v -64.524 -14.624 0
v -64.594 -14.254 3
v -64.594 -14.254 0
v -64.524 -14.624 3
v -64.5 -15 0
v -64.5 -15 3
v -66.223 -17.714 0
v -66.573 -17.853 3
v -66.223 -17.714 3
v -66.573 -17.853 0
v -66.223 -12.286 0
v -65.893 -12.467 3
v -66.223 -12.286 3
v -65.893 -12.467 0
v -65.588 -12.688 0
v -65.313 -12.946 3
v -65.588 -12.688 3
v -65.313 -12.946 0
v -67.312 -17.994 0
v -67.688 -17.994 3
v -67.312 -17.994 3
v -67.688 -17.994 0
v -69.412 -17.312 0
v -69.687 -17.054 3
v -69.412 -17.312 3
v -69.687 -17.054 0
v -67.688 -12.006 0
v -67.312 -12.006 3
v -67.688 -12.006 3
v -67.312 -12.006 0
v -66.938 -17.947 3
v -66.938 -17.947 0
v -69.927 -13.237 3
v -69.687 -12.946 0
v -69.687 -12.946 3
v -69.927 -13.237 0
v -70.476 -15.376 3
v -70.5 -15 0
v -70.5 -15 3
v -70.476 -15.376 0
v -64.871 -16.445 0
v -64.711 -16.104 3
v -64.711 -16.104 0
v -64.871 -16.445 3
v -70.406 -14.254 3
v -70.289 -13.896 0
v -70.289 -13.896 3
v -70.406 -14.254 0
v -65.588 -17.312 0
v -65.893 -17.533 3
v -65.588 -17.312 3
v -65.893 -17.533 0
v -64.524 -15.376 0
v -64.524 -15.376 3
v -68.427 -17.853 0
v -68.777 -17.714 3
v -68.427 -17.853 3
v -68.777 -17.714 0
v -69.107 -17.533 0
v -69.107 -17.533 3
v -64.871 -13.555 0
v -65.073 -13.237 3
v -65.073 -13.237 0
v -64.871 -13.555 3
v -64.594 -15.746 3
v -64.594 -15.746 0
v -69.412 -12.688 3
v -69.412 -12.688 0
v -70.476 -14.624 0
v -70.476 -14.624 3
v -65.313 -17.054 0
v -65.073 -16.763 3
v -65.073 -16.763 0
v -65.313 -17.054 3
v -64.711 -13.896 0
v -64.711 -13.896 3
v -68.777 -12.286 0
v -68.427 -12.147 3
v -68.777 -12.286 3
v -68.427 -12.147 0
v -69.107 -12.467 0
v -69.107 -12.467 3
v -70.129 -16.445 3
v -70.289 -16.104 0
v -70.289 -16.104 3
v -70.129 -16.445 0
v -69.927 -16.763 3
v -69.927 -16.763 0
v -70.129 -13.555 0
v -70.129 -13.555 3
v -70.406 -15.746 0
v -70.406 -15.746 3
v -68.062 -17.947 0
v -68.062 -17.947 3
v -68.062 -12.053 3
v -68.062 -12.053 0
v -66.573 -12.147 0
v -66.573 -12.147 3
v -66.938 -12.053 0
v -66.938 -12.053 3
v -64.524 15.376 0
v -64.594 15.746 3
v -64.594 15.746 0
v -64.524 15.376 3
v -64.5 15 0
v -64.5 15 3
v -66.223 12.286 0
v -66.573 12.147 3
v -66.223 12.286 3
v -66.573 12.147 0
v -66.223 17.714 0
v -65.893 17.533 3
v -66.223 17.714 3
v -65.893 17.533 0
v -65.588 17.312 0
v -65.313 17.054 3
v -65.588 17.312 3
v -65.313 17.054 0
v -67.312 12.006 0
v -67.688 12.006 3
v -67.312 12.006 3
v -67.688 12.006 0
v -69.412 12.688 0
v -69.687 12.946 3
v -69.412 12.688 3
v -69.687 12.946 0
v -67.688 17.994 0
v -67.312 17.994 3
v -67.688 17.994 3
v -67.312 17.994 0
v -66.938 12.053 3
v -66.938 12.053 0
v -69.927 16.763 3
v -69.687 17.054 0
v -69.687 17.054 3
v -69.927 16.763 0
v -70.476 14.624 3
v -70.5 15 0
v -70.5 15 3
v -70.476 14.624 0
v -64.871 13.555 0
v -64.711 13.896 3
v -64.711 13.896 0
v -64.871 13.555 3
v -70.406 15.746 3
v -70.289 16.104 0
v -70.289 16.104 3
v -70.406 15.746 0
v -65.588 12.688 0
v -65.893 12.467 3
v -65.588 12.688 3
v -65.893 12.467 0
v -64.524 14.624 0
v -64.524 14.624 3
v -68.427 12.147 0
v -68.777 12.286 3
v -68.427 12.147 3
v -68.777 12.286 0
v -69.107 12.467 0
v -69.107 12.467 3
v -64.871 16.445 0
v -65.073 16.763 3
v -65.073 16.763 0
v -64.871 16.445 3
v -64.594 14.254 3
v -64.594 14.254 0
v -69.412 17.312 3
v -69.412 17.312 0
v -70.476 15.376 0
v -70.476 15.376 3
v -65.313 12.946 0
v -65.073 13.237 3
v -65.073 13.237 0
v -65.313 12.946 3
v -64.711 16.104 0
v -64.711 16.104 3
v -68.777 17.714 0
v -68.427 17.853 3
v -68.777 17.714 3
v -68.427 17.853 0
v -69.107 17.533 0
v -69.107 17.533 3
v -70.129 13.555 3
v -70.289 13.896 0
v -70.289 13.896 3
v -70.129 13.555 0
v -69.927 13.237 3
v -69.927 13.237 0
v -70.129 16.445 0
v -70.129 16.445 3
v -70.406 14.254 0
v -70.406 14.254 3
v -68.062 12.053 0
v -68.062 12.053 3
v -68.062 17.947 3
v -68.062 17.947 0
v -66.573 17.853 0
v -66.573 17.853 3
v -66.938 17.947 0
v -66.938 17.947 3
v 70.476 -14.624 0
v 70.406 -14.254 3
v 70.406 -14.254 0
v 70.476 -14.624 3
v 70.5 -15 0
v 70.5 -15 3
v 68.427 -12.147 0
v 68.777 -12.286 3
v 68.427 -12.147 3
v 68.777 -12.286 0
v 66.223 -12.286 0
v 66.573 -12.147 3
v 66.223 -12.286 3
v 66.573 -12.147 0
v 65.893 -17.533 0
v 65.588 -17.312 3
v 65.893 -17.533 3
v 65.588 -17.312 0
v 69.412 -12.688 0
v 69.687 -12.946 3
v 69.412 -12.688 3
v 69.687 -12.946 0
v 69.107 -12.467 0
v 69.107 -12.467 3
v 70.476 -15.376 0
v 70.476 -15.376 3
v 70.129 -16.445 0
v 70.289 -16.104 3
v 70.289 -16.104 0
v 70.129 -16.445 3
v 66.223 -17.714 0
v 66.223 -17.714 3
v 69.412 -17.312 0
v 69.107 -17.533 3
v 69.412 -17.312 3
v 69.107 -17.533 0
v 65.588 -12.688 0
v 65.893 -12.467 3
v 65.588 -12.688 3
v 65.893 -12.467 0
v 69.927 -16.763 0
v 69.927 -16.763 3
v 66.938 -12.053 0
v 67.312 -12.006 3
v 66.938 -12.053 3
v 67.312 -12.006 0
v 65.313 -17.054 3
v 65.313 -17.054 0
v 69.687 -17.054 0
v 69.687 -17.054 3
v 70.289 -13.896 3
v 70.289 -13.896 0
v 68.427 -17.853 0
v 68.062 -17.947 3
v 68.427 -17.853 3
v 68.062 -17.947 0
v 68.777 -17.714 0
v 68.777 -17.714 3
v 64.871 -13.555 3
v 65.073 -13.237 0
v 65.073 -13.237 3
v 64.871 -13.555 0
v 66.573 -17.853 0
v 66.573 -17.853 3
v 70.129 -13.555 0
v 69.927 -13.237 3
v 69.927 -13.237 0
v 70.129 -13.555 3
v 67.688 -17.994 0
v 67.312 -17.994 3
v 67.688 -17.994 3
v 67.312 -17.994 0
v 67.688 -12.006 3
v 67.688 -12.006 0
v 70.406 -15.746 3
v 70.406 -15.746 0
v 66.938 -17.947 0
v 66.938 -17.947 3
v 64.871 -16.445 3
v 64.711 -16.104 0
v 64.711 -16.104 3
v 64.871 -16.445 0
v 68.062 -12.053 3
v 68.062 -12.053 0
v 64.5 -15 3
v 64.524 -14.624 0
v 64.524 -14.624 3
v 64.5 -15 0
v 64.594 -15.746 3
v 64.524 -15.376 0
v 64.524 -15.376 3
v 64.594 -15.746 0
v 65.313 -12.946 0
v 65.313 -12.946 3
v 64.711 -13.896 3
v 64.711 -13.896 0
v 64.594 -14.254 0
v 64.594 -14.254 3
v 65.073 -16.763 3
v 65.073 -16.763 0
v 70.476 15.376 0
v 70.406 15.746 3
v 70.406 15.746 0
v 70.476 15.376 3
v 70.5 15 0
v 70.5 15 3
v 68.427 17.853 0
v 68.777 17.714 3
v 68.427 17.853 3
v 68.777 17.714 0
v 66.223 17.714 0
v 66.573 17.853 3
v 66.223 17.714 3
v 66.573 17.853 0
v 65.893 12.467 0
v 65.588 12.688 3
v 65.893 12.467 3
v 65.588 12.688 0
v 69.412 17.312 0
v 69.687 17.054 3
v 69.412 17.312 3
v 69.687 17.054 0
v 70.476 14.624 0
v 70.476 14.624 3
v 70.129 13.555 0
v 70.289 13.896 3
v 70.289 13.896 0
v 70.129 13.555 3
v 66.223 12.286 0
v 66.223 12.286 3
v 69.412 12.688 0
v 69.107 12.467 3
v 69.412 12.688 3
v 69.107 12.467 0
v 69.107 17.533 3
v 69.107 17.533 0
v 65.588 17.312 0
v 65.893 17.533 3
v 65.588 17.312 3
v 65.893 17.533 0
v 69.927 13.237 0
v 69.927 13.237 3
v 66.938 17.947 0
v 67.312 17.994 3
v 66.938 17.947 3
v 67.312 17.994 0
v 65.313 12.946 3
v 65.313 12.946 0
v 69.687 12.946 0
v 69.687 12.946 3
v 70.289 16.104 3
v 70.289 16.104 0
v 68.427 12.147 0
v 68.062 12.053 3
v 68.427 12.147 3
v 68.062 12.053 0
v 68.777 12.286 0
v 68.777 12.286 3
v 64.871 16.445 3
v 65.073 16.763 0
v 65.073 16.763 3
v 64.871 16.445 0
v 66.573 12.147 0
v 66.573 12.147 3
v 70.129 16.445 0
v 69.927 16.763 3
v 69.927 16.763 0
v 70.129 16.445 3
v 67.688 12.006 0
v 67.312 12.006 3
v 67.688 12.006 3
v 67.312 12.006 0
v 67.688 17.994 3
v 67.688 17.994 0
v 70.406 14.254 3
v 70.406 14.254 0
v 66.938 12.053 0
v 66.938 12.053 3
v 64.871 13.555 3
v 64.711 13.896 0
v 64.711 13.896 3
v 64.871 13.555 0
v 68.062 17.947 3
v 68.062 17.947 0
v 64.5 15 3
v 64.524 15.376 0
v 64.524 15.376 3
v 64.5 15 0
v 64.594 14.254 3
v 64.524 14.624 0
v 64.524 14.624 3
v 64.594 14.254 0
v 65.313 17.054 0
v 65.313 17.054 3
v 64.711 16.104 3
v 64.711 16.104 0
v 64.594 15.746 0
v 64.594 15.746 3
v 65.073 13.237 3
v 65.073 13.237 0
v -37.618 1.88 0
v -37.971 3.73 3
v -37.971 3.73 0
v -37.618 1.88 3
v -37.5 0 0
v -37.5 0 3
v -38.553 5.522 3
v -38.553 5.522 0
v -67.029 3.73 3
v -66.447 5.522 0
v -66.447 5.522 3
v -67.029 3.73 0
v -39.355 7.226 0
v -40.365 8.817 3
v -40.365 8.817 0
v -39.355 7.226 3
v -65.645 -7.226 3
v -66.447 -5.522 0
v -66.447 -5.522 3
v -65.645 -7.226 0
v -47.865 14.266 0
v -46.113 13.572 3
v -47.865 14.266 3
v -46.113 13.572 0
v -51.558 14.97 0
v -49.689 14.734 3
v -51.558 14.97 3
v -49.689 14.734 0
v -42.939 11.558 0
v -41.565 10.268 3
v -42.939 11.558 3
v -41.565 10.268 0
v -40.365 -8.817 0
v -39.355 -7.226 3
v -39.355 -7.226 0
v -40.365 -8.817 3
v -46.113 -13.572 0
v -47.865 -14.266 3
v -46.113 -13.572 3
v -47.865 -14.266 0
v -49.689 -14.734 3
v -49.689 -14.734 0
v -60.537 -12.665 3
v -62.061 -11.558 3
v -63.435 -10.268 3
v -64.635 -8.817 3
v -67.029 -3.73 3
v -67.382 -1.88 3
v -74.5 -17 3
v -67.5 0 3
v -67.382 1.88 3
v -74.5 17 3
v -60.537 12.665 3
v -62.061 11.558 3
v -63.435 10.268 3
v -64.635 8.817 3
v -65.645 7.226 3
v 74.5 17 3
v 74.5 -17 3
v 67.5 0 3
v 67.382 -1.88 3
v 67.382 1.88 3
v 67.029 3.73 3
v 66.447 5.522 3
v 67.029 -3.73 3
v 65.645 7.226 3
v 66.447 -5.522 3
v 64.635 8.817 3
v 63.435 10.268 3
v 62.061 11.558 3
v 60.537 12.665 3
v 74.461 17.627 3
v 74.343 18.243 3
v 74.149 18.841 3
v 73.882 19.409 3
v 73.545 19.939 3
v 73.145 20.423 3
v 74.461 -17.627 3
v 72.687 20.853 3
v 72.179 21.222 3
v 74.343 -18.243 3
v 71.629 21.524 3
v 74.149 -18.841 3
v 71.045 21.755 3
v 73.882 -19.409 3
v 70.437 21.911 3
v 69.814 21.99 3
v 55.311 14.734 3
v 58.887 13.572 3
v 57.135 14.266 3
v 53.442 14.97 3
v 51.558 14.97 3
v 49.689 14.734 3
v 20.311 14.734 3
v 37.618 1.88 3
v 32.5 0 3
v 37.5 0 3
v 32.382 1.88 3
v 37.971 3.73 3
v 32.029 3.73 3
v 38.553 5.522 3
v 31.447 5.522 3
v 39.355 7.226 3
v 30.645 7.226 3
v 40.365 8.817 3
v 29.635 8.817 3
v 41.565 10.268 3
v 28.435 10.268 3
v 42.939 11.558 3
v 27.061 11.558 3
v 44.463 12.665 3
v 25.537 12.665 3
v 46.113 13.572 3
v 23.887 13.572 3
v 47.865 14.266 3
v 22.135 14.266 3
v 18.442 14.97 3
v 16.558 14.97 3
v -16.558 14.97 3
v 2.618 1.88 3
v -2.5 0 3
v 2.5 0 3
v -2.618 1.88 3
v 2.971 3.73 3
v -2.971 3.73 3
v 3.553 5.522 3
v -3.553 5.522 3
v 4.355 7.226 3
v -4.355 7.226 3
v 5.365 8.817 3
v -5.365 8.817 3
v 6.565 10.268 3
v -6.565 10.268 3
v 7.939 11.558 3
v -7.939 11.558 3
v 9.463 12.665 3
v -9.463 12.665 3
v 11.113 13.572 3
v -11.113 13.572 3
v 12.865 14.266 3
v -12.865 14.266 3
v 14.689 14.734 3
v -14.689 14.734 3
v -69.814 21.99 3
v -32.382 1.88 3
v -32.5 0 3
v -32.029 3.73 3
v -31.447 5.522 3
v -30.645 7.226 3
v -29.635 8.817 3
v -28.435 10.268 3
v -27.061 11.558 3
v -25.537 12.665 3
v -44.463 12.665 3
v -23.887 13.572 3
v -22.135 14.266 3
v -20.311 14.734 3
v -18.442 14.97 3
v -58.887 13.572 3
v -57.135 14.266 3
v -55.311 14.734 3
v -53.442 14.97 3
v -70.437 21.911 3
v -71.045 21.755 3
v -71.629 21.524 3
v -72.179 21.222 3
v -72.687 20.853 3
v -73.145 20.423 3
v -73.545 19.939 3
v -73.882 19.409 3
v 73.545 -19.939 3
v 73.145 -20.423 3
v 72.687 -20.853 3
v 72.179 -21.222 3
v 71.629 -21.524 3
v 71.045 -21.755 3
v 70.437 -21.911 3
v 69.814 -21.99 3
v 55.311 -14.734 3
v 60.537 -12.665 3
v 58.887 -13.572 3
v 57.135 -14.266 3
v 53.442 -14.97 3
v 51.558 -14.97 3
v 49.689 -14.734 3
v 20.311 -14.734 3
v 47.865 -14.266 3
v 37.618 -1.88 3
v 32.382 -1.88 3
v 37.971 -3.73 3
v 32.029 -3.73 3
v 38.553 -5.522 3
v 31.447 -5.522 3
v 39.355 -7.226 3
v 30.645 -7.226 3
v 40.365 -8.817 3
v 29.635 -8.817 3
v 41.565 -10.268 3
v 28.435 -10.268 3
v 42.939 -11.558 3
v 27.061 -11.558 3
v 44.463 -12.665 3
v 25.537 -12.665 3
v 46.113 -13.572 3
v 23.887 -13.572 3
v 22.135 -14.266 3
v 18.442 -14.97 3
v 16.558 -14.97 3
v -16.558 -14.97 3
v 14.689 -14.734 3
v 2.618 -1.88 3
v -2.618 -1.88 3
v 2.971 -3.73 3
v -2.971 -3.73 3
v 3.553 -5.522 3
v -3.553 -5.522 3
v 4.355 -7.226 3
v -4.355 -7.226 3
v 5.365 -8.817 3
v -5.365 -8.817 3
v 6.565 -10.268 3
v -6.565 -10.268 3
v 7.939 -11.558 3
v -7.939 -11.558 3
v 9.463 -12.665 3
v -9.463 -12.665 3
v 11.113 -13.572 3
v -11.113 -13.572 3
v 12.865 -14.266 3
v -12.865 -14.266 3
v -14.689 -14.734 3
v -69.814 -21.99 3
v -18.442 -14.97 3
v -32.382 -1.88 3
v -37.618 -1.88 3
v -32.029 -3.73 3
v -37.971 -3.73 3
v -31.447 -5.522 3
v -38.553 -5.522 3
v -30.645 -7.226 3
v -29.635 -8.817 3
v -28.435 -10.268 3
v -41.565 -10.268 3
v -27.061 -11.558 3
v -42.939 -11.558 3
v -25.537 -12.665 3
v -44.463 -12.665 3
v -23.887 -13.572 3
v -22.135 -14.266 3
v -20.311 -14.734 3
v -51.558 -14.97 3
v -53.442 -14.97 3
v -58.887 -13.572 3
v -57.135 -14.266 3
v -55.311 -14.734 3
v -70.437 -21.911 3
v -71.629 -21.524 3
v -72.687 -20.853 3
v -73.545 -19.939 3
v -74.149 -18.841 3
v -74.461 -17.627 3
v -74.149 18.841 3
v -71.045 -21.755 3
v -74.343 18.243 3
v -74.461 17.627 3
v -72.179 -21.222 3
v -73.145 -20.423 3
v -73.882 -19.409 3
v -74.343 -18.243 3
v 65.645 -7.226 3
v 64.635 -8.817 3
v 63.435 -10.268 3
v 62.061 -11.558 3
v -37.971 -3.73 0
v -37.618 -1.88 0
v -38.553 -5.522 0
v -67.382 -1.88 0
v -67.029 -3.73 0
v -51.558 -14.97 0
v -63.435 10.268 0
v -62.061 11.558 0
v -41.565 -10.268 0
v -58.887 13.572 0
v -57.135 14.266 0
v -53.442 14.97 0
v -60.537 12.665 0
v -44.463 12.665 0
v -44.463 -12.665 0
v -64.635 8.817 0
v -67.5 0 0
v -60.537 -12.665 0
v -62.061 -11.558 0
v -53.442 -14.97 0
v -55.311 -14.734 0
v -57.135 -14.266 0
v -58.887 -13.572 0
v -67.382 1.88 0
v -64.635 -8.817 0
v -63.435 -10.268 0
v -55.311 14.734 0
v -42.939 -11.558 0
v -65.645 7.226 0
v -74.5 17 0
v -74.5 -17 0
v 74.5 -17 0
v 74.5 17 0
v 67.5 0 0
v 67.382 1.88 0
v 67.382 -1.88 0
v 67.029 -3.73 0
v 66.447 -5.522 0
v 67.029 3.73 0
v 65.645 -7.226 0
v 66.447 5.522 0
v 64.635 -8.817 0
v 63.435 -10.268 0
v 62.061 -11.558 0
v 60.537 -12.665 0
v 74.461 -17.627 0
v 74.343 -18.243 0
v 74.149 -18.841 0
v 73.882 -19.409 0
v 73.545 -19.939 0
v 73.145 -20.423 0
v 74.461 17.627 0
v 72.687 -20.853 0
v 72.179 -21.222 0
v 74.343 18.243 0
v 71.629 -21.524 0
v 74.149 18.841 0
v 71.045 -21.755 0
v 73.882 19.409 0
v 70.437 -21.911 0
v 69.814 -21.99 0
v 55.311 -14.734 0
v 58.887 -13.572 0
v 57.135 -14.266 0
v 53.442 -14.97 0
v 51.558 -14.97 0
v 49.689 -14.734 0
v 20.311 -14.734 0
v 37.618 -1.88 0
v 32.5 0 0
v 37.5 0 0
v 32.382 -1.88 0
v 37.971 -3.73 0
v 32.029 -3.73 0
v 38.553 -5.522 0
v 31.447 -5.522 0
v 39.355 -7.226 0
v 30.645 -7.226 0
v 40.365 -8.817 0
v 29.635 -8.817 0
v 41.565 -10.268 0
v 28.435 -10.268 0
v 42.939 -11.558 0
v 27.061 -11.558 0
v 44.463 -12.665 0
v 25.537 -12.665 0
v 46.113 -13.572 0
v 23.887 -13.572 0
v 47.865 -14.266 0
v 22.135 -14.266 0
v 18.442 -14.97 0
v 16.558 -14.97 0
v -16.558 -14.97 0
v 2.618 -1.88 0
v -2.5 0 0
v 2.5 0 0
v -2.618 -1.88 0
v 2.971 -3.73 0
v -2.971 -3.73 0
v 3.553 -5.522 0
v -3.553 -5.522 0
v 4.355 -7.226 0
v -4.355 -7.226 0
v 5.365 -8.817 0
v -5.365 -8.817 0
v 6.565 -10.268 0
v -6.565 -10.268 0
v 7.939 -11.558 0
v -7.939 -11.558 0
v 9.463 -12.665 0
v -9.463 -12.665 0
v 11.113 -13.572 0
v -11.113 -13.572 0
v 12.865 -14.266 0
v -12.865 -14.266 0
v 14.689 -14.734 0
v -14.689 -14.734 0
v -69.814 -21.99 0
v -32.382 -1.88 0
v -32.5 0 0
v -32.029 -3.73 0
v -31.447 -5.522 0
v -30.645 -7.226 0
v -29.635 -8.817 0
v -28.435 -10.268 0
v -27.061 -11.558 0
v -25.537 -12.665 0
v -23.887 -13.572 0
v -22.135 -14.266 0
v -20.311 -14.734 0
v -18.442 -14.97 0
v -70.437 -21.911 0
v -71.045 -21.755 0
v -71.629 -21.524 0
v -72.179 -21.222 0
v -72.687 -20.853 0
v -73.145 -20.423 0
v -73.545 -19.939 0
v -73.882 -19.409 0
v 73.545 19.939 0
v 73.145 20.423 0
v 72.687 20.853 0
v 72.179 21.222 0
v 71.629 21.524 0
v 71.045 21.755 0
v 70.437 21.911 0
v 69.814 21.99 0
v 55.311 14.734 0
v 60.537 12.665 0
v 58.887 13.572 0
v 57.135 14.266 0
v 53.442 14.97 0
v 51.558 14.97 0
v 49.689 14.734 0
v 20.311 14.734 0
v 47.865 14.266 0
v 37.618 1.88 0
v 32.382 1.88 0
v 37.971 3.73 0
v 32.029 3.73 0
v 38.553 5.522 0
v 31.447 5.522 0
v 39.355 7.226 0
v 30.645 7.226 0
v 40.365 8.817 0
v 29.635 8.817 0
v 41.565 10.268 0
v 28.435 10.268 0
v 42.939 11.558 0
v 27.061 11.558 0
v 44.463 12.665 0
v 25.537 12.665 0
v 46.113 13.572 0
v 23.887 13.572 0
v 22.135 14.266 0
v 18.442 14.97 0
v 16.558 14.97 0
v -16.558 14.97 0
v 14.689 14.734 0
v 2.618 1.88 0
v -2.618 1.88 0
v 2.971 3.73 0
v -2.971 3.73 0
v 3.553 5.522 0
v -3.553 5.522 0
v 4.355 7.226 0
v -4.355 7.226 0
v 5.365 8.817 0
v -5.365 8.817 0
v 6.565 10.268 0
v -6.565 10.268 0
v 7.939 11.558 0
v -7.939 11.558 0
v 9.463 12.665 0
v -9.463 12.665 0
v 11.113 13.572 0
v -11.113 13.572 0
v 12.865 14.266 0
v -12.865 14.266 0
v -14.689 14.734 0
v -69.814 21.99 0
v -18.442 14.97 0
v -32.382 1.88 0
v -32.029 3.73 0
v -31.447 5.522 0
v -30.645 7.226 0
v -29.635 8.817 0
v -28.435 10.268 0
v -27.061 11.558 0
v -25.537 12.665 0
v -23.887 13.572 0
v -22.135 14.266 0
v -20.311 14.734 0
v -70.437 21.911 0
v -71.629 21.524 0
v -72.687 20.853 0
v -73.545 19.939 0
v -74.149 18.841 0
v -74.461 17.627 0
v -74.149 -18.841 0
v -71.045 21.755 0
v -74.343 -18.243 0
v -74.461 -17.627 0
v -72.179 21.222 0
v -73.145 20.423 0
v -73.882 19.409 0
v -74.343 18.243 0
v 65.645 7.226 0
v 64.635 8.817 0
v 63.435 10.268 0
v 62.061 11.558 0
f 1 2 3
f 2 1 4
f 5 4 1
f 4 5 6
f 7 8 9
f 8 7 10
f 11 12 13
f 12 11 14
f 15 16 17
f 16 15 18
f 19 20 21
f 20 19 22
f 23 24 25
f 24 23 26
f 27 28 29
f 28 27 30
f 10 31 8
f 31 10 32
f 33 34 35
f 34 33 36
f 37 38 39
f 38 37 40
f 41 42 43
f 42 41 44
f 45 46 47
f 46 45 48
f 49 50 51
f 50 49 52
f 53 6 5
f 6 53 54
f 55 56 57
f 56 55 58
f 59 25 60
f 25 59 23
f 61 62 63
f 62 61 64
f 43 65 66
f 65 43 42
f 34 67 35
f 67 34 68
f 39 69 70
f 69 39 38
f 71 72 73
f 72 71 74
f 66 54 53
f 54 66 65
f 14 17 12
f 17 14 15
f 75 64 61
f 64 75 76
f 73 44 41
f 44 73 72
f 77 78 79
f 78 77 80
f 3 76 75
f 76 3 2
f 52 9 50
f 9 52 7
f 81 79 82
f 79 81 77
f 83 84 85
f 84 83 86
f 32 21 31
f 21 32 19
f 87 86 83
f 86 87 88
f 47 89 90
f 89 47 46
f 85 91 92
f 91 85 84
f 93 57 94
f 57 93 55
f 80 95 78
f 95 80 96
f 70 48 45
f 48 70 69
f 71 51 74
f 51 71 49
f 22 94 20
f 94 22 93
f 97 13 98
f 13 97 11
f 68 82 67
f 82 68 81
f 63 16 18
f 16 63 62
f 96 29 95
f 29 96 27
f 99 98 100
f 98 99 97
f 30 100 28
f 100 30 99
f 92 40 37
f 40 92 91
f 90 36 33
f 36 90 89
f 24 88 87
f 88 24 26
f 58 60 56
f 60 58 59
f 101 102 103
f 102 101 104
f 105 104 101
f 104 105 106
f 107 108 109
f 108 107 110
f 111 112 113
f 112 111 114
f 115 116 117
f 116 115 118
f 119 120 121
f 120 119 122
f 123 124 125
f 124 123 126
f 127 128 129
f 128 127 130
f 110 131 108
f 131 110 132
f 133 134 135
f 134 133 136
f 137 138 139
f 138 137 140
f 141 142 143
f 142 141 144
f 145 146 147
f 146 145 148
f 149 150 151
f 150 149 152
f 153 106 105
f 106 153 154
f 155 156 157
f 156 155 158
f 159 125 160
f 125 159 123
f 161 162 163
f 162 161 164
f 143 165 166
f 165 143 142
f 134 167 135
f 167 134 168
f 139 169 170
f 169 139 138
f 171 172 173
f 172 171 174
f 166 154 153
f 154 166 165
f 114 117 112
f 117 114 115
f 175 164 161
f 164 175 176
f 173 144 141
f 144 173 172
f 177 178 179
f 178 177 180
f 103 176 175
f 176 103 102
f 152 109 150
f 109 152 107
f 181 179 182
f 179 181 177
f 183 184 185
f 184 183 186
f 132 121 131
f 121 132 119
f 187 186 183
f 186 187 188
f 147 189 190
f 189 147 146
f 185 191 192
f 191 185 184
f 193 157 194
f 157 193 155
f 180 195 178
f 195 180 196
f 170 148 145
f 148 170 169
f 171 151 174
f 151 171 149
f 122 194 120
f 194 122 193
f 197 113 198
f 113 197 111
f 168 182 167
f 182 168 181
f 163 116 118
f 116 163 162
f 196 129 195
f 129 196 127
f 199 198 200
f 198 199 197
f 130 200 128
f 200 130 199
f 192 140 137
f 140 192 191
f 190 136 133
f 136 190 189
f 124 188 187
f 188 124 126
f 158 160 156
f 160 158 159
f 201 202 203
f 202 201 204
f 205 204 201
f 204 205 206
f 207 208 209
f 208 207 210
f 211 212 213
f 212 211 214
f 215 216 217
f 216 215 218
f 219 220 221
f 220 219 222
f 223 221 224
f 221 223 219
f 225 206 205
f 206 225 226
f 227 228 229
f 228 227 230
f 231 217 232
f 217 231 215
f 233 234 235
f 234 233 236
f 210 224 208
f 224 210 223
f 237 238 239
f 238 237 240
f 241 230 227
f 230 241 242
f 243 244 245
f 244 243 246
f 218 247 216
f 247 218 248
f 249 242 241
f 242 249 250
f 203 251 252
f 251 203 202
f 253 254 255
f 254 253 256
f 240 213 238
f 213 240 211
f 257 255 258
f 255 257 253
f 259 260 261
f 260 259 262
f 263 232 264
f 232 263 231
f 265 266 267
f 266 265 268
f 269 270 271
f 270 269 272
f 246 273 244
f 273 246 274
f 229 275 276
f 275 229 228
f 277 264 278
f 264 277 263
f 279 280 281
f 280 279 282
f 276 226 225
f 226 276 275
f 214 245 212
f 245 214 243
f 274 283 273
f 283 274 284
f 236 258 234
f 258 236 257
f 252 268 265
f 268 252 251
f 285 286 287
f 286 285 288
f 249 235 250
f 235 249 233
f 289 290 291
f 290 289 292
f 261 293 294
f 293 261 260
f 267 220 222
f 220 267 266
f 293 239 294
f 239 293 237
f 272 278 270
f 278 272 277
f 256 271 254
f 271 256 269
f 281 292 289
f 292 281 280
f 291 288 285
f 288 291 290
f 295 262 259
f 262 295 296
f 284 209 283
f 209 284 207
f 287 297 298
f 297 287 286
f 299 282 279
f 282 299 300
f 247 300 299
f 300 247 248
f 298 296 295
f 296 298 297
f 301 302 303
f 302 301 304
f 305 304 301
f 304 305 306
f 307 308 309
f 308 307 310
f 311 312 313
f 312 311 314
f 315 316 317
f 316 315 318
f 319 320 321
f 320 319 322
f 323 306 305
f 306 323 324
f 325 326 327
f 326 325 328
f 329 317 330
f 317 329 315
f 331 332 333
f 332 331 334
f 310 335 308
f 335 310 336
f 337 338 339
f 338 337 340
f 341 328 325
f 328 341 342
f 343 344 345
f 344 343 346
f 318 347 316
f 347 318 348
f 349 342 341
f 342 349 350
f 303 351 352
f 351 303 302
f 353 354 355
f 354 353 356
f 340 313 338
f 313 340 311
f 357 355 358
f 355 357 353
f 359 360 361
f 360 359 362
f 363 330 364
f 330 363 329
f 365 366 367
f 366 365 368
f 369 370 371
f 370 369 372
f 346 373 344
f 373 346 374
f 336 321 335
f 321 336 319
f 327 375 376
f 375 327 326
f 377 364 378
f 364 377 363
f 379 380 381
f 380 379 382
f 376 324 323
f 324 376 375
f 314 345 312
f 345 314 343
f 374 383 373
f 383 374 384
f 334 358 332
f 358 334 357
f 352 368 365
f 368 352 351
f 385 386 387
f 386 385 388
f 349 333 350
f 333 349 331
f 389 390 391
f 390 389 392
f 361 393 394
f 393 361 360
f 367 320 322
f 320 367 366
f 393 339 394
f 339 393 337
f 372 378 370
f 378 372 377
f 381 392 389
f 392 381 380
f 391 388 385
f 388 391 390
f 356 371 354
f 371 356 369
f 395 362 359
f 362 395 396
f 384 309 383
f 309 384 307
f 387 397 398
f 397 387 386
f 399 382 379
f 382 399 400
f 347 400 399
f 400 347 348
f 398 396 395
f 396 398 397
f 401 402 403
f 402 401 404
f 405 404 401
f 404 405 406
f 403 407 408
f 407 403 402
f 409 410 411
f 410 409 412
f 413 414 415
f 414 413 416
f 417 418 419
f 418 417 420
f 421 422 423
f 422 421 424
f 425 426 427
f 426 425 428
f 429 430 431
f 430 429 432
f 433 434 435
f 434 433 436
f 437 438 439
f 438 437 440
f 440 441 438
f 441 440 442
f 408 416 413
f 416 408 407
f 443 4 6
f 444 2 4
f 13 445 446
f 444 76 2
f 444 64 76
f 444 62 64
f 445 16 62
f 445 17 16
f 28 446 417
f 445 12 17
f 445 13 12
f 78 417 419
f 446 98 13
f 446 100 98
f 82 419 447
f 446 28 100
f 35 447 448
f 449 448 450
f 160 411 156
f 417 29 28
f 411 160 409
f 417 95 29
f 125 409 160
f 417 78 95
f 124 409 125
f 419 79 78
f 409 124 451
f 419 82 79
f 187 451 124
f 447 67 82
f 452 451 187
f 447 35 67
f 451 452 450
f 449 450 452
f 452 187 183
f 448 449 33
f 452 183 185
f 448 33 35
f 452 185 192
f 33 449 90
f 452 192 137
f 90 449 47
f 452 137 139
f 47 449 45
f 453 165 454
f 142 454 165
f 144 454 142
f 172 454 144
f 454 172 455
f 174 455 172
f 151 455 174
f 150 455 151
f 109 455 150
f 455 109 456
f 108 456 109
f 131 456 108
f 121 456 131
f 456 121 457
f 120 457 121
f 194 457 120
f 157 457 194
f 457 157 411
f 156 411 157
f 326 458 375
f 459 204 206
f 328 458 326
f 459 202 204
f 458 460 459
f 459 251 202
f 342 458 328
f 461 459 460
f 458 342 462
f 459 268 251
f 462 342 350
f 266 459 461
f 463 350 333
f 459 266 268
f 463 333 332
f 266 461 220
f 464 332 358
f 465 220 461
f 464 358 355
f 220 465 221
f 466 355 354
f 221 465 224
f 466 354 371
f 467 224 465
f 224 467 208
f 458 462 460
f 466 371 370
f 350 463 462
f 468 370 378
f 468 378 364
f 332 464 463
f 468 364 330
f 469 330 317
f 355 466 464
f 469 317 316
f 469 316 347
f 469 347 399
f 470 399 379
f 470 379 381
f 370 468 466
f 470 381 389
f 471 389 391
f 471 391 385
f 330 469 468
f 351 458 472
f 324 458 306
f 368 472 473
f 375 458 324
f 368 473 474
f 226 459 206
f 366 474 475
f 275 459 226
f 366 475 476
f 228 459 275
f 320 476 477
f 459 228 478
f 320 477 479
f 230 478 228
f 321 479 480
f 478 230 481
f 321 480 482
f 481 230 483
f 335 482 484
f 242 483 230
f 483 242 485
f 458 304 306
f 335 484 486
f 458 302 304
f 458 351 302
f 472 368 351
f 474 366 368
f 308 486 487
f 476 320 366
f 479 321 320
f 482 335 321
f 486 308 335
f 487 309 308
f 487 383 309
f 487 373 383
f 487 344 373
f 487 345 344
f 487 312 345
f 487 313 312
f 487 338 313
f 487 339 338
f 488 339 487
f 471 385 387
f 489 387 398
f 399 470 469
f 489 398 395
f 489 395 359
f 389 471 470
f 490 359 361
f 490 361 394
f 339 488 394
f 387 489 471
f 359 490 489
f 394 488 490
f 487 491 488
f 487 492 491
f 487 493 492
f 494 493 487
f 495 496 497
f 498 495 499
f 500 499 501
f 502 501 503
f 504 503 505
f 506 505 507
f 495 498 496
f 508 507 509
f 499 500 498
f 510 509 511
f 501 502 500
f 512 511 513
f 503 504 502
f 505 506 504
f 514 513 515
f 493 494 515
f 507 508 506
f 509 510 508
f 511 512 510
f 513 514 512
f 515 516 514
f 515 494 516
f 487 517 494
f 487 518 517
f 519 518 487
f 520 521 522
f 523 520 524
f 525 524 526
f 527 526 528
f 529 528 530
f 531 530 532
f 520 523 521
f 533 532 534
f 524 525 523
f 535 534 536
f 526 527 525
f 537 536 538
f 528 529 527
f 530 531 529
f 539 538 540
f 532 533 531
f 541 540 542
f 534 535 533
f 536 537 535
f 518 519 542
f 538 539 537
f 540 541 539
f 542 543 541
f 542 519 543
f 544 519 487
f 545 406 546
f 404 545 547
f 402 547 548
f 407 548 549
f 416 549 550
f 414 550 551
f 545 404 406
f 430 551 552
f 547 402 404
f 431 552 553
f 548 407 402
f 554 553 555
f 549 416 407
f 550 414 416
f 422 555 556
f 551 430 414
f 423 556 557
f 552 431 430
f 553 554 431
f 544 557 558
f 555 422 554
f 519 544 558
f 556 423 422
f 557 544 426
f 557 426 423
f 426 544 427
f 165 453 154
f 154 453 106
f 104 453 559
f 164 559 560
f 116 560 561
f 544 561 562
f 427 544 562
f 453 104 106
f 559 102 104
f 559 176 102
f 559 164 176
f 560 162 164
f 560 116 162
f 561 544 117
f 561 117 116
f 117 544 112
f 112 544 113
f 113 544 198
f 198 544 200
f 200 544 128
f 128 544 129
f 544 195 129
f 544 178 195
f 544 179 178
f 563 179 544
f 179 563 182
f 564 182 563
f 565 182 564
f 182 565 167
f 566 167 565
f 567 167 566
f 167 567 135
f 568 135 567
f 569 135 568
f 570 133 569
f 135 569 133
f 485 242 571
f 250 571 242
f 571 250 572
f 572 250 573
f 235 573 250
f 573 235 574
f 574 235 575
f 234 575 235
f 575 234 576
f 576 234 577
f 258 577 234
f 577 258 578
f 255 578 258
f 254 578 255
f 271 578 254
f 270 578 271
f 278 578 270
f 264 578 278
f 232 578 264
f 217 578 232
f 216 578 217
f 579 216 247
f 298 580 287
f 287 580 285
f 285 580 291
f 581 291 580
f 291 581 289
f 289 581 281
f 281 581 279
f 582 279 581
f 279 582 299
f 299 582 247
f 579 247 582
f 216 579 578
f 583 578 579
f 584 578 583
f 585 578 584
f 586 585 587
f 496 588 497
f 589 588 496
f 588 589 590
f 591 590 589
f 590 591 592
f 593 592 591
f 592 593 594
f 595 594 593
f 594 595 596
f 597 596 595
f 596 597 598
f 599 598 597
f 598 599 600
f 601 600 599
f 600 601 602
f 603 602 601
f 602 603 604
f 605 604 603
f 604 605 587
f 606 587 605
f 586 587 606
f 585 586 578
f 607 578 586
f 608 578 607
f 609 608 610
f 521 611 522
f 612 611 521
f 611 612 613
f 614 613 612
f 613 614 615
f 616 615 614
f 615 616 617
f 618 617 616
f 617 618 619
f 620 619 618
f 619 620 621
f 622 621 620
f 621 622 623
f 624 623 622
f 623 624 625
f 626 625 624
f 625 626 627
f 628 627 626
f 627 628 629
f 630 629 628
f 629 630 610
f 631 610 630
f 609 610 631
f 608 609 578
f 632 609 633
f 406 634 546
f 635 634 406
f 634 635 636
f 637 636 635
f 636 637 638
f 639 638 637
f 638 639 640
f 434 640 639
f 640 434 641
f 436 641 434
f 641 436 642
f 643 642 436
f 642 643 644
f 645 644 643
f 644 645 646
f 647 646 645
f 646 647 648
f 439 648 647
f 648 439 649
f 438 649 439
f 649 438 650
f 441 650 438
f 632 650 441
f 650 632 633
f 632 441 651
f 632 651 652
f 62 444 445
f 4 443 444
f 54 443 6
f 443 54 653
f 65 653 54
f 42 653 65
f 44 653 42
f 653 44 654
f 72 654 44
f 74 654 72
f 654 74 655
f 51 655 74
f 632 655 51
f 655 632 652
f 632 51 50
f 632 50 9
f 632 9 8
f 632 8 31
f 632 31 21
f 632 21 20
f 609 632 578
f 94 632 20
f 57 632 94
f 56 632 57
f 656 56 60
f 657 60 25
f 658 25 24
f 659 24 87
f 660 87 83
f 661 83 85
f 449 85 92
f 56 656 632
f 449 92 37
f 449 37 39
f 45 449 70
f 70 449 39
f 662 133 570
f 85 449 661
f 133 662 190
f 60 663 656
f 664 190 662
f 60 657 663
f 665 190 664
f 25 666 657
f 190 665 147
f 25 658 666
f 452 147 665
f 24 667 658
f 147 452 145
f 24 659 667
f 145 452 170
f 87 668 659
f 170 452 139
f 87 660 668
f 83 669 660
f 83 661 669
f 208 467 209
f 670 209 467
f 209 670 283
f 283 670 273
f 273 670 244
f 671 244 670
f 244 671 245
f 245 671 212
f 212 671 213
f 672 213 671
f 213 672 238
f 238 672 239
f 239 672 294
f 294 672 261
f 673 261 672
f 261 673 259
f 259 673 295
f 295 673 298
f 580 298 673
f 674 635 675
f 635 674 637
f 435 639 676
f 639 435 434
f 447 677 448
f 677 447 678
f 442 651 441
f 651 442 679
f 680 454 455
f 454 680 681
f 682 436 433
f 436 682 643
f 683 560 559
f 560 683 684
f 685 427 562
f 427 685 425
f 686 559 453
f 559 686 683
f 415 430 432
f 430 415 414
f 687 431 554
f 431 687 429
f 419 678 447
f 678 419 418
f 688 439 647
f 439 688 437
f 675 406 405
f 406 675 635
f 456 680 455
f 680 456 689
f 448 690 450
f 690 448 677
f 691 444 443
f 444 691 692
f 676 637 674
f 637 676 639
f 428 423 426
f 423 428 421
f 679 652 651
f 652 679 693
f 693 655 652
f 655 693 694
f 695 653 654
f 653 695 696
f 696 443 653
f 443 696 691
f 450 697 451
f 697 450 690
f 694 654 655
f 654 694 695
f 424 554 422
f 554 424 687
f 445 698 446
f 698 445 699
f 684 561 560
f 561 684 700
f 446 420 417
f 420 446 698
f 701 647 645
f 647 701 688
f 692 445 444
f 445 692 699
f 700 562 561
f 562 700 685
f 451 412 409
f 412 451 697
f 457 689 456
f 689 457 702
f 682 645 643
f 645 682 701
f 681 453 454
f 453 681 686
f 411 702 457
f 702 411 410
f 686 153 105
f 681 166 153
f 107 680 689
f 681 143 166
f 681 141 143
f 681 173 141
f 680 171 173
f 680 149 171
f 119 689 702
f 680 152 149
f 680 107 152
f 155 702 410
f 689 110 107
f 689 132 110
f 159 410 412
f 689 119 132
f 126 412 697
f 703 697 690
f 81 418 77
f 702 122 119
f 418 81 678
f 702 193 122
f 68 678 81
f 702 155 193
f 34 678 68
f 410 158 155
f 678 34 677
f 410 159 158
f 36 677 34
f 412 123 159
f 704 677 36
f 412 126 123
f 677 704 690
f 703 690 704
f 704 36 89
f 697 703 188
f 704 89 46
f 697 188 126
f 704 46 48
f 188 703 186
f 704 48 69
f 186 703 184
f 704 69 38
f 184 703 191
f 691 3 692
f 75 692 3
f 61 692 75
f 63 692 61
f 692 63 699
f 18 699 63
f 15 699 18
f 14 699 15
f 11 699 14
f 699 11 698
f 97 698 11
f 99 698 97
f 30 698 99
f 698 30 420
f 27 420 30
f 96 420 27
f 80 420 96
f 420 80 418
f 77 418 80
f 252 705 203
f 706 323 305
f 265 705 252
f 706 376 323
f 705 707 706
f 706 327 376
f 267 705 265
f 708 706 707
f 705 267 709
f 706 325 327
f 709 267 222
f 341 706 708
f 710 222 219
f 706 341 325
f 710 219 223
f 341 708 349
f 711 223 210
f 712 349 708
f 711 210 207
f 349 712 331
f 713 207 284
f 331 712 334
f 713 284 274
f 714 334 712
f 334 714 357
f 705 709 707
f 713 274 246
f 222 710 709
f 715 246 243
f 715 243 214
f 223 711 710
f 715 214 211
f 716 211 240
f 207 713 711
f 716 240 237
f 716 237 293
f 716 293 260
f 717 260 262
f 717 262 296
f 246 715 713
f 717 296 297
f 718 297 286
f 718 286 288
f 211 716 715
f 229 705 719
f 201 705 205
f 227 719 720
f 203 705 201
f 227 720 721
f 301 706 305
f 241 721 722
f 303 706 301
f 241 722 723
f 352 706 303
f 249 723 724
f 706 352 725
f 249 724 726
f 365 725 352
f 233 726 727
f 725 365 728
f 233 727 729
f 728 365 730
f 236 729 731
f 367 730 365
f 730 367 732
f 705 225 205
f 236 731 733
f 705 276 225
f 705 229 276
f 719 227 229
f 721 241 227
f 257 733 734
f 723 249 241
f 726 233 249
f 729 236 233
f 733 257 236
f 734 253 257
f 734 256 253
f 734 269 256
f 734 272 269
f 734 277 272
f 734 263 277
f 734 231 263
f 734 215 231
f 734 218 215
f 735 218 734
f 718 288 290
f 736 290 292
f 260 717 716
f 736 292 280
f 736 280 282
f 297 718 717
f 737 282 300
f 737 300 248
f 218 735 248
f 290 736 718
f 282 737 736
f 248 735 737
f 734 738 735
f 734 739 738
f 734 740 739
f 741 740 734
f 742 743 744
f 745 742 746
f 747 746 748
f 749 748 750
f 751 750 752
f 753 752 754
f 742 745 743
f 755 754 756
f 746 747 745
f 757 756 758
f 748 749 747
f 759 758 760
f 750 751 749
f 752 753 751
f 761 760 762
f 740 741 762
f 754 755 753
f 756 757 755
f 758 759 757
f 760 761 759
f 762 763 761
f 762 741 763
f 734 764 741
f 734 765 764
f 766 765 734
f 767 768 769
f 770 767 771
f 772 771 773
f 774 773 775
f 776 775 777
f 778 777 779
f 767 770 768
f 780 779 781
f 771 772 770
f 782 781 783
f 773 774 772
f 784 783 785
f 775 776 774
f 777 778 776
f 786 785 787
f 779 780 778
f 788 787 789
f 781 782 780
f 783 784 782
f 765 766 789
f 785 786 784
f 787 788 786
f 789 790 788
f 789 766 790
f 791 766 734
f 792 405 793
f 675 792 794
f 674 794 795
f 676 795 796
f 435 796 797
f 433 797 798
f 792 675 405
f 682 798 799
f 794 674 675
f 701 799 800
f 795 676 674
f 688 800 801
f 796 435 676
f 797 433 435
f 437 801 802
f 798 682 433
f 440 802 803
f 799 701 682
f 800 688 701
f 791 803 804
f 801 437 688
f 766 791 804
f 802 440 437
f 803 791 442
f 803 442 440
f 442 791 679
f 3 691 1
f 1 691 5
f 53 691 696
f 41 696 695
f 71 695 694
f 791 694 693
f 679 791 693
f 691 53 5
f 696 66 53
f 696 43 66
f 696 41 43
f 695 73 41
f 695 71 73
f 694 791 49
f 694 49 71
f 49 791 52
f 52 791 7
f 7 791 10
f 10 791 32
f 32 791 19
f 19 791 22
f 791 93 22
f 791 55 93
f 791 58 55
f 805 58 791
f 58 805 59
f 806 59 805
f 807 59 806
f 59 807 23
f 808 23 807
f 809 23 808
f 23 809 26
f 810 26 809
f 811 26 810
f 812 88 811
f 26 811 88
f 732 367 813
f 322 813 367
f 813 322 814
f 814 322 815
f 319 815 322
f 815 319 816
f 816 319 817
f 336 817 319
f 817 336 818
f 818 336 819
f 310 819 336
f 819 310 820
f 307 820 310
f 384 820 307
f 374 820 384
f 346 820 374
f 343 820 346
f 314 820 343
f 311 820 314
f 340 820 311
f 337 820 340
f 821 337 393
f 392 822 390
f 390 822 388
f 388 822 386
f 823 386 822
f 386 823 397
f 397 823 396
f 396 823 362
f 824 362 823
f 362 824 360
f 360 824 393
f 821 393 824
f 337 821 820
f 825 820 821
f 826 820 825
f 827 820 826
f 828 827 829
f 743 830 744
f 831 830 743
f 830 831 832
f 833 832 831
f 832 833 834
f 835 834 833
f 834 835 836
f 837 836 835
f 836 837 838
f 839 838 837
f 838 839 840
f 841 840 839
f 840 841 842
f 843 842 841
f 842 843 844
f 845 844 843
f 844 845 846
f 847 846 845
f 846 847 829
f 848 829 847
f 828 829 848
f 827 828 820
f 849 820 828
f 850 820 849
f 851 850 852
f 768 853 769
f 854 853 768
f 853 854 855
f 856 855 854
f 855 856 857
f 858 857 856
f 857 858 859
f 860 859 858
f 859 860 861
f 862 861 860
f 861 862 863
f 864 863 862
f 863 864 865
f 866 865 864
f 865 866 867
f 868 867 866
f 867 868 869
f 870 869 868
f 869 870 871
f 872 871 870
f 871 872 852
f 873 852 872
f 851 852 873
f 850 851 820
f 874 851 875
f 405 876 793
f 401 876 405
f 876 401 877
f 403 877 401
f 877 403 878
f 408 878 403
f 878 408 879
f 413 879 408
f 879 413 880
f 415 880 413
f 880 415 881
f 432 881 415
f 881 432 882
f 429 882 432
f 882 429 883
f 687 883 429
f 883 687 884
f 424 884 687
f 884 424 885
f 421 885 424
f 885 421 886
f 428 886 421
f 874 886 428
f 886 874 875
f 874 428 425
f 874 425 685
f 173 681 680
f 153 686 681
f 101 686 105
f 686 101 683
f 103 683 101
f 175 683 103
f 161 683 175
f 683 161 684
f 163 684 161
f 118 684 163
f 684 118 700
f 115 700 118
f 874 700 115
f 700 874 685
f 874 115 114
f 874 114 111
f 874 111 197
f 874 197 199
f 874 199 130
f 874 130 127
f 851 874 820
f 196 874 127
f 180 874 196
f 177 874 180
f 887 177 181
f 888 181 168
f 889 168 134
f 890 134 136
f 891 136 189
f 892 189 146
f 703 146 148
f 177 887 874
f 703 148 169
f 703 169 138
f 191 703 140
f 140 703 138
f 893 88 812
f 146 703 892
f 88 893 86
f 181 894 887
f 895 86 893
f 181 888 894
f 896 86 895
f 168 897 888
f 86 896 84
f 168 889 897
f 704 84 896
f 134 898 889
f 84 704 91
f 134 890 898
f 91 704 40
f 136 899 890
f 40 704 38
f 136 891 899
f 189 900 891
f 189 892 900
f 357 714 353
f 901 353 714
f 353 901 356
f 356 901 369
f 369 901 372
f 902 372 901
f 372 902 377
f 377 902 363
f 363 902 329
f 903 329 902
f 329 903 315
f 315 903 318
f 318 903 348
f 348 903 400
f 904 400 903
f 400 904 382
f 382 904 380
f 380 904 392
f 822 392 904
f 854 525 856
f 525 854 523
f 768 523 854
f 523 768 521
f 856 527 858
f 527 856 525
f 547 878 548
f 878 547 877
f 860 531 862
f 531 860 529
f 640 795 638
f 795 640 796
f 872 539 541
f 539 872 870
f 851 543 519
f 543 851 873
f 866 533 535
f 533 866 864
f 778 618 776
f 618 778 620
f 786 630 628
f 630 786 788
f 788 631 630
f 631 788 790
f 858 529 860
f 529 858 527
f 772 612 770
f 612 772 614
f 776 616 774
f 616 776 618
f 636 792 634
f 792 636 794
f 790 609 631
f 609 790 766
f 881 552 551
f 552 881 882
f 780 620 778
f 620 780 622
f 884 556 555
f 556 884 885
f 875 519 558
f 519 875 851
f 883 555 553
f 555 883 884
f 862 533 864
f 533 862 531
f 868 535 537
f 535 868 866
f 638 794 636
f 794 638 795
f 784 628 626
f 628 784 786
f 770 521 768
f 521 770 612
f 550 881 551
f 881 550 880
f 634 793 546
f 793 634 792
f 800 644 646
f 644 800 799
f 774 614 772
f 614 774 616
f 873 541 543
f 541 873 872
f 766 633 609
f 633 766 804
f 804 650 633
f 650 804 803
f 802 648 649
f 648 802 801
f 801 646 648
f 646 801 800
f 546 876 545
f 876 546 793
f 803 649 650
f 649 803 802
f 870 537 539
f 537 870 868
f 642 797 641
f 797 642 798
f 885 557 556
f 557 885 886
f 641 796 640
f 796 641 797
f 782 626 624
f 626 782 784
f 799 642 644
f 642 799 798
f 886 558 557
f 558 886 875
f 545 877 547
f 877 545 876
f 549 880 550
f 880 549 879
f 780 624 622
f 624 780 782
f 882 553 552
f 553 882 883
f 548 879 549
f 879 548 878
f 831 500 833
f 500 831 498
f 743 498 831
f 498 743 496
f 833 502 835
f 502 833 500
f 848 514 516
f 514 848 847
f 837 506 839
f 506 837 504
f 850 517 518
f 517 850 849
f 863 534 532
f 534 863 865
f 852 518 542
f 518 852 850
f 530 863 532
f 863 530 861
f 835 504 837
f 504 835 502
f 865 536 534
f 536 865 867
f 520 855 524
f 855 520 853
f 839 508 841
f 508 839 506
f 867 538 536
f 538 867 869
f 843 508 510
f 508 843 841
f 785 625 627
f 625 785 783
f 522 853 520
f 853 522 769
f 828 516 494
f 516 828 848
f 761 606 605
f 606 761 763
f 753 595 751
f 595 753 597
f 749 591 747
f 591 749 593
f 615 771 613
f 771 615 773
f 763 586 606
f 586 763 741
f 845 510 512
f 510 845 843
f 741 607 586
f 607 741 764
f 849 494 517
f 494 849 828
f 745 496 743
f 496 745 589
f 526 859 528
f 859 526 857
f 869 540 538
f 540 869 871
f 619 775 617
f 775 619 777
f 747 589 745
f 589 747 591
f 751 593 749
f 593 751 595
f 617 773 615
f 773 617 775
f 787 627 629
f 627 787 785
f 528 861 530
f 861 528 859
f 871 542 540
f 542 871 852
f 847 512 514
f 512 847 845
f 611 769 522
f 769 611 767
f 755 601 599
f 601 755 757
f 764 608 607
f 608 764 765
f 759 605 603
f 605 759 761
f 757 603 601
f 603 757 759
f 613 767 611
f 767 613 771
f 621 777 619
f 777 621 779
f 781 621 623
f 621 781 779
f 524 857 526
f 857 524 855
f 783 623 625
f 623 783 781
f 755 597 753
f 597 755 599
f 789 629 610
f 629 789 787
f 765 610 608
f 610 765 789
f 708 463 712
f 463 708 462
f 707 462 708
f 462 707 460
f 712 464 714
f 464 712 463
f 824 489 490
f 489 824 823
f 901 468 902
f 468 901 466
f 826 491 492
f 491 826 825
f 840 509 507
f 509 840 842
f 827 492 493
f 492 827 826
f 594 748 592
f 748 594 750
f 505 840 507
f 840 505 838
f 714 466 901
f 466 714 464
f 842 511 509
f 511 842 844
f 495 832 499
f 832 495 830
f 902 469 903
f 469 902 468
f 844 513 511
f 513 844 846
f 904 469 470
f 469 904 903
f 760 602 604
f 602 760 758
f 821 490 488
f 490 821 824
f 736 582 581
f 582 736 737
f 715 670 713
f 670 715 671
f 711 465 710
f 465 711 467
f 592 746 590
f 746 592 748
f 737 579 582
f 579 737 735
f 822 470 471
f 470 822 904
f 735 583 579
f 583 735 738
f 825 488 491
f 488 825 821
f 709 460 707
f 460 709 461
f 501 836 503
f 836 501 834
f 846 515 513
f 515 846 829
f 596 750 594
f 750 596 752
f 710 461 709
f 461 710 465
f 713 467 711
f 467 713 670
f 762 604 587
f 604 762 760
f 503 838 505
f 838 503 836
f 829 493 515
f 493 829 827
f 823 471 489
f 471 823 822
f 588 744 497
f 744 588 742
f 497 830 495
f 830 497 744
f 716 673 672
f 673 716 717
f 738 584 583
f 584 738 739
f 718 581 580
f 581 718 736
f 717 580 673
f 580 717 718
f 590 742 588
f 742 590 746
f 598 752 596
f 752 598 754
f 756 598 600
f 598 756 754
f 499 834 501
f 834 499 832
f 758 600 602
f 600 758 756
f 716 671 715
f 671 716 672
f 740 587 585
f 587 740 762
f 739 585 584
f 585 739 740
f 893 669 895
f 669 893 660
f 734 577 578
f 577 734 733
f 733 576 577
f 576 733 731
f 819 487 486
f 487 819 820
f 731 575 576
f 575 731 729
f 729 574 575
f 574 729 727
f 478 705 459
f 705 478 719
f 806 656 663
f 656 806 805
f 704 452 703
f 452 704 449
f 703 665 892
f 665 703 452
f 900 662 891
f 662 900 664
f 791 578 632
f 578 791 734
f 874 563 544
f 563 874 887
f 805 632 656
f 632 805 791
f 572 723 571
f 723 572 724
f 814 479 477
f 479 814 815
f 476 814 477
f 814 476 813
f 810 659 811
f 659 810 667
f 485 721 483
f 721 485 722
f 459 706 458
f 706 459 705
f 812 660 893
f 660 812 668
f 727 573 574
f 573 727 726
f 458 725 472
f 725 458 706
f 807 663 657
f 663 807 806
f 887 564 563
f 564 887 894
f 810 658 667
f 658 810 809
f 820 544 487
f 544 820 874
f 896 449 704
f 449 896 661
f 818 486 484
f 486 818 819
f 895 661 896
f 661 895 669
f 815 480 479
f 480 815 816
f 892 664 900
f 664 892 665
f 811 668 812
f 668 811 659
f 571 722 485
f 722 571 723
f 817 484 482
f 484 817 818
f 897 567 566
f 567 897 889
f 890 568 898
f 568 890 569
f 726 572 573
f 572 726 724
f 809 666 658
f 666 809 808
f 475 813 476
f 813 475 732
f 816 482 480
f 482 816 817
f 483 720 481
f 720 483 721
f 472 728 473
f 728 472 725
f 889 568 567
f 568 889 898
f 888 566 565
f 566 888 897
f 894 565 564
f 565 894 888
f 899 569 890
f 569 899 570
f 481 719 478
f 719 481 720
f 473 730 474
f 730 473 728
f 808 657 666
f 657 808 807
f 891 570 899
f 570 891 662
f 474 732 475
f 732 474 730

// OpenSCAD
$fn = 50;

difference() {
	union() {
		hull() {
			translate(v = [-69.5, 17.0, 0]) {
				cylinder(h = 3, r = 5);
			}
			translate(v = [69.5, 17.0, 0]) {
				cylinder(h = 3, r = 5);
			}
			translate(v = [-69.5, -17.0, 0]) {
				cylinder(h = 3, r = 5);
			}
			translate(v = [69.5, -17.0, 0]) {
				cylinder(h = 3, r = 5);
			}
		}
	}
	union() {
		translate(v = [-67.5, -15.0, -100.0]) {
			cylinder(h = 200, r = 3.0);
		}
		translate(v = [-67.5, 15.0, -100.0]) {
			cylinder(h = 200, r = 3.0);
		}
		translate(v = [67.5, -15.0, -100.0]) {
			cylinder(h = 200, r = 3.0);
		}
		translate(v = [67.5, 15.0, -100.0]) {
			cylinder(h = 200, r = 3.0);
		}
		translate(v = [-67.5, -15.0, -100.0]) {
			cylinder(h = 200, r = 1.5);
		}
		translate(v = [-67.5, 15.0, -100.0]) {
			cylinder(h = 200, r = 1.5);
		}
		translate(v = [67.5, -15.0, -100.0]) {
			cylinder(h = 200, r = 1.5);
		}
		translate(v = [67.5, 15.0, -100.0]) {
			cylinder(h = 200, r = 1.5);
		}
		translate(v = [-52.5, 0, 0.0]) {
			cylinder(h = 3, r = 15.0);
		}
		translate(v = [-17.5, 0, 0.0]) {
			cylinder(h = 3, r = 15.0);
		}
		translate(v = [17.5, 0, 0.0]) {
			cylinder(h = 3, r = 15.0);
		}
		translate(v = [52.5, 0, 0.0]) {
			cylinder(h = 3, r = 15.0);
		}
	}
}
